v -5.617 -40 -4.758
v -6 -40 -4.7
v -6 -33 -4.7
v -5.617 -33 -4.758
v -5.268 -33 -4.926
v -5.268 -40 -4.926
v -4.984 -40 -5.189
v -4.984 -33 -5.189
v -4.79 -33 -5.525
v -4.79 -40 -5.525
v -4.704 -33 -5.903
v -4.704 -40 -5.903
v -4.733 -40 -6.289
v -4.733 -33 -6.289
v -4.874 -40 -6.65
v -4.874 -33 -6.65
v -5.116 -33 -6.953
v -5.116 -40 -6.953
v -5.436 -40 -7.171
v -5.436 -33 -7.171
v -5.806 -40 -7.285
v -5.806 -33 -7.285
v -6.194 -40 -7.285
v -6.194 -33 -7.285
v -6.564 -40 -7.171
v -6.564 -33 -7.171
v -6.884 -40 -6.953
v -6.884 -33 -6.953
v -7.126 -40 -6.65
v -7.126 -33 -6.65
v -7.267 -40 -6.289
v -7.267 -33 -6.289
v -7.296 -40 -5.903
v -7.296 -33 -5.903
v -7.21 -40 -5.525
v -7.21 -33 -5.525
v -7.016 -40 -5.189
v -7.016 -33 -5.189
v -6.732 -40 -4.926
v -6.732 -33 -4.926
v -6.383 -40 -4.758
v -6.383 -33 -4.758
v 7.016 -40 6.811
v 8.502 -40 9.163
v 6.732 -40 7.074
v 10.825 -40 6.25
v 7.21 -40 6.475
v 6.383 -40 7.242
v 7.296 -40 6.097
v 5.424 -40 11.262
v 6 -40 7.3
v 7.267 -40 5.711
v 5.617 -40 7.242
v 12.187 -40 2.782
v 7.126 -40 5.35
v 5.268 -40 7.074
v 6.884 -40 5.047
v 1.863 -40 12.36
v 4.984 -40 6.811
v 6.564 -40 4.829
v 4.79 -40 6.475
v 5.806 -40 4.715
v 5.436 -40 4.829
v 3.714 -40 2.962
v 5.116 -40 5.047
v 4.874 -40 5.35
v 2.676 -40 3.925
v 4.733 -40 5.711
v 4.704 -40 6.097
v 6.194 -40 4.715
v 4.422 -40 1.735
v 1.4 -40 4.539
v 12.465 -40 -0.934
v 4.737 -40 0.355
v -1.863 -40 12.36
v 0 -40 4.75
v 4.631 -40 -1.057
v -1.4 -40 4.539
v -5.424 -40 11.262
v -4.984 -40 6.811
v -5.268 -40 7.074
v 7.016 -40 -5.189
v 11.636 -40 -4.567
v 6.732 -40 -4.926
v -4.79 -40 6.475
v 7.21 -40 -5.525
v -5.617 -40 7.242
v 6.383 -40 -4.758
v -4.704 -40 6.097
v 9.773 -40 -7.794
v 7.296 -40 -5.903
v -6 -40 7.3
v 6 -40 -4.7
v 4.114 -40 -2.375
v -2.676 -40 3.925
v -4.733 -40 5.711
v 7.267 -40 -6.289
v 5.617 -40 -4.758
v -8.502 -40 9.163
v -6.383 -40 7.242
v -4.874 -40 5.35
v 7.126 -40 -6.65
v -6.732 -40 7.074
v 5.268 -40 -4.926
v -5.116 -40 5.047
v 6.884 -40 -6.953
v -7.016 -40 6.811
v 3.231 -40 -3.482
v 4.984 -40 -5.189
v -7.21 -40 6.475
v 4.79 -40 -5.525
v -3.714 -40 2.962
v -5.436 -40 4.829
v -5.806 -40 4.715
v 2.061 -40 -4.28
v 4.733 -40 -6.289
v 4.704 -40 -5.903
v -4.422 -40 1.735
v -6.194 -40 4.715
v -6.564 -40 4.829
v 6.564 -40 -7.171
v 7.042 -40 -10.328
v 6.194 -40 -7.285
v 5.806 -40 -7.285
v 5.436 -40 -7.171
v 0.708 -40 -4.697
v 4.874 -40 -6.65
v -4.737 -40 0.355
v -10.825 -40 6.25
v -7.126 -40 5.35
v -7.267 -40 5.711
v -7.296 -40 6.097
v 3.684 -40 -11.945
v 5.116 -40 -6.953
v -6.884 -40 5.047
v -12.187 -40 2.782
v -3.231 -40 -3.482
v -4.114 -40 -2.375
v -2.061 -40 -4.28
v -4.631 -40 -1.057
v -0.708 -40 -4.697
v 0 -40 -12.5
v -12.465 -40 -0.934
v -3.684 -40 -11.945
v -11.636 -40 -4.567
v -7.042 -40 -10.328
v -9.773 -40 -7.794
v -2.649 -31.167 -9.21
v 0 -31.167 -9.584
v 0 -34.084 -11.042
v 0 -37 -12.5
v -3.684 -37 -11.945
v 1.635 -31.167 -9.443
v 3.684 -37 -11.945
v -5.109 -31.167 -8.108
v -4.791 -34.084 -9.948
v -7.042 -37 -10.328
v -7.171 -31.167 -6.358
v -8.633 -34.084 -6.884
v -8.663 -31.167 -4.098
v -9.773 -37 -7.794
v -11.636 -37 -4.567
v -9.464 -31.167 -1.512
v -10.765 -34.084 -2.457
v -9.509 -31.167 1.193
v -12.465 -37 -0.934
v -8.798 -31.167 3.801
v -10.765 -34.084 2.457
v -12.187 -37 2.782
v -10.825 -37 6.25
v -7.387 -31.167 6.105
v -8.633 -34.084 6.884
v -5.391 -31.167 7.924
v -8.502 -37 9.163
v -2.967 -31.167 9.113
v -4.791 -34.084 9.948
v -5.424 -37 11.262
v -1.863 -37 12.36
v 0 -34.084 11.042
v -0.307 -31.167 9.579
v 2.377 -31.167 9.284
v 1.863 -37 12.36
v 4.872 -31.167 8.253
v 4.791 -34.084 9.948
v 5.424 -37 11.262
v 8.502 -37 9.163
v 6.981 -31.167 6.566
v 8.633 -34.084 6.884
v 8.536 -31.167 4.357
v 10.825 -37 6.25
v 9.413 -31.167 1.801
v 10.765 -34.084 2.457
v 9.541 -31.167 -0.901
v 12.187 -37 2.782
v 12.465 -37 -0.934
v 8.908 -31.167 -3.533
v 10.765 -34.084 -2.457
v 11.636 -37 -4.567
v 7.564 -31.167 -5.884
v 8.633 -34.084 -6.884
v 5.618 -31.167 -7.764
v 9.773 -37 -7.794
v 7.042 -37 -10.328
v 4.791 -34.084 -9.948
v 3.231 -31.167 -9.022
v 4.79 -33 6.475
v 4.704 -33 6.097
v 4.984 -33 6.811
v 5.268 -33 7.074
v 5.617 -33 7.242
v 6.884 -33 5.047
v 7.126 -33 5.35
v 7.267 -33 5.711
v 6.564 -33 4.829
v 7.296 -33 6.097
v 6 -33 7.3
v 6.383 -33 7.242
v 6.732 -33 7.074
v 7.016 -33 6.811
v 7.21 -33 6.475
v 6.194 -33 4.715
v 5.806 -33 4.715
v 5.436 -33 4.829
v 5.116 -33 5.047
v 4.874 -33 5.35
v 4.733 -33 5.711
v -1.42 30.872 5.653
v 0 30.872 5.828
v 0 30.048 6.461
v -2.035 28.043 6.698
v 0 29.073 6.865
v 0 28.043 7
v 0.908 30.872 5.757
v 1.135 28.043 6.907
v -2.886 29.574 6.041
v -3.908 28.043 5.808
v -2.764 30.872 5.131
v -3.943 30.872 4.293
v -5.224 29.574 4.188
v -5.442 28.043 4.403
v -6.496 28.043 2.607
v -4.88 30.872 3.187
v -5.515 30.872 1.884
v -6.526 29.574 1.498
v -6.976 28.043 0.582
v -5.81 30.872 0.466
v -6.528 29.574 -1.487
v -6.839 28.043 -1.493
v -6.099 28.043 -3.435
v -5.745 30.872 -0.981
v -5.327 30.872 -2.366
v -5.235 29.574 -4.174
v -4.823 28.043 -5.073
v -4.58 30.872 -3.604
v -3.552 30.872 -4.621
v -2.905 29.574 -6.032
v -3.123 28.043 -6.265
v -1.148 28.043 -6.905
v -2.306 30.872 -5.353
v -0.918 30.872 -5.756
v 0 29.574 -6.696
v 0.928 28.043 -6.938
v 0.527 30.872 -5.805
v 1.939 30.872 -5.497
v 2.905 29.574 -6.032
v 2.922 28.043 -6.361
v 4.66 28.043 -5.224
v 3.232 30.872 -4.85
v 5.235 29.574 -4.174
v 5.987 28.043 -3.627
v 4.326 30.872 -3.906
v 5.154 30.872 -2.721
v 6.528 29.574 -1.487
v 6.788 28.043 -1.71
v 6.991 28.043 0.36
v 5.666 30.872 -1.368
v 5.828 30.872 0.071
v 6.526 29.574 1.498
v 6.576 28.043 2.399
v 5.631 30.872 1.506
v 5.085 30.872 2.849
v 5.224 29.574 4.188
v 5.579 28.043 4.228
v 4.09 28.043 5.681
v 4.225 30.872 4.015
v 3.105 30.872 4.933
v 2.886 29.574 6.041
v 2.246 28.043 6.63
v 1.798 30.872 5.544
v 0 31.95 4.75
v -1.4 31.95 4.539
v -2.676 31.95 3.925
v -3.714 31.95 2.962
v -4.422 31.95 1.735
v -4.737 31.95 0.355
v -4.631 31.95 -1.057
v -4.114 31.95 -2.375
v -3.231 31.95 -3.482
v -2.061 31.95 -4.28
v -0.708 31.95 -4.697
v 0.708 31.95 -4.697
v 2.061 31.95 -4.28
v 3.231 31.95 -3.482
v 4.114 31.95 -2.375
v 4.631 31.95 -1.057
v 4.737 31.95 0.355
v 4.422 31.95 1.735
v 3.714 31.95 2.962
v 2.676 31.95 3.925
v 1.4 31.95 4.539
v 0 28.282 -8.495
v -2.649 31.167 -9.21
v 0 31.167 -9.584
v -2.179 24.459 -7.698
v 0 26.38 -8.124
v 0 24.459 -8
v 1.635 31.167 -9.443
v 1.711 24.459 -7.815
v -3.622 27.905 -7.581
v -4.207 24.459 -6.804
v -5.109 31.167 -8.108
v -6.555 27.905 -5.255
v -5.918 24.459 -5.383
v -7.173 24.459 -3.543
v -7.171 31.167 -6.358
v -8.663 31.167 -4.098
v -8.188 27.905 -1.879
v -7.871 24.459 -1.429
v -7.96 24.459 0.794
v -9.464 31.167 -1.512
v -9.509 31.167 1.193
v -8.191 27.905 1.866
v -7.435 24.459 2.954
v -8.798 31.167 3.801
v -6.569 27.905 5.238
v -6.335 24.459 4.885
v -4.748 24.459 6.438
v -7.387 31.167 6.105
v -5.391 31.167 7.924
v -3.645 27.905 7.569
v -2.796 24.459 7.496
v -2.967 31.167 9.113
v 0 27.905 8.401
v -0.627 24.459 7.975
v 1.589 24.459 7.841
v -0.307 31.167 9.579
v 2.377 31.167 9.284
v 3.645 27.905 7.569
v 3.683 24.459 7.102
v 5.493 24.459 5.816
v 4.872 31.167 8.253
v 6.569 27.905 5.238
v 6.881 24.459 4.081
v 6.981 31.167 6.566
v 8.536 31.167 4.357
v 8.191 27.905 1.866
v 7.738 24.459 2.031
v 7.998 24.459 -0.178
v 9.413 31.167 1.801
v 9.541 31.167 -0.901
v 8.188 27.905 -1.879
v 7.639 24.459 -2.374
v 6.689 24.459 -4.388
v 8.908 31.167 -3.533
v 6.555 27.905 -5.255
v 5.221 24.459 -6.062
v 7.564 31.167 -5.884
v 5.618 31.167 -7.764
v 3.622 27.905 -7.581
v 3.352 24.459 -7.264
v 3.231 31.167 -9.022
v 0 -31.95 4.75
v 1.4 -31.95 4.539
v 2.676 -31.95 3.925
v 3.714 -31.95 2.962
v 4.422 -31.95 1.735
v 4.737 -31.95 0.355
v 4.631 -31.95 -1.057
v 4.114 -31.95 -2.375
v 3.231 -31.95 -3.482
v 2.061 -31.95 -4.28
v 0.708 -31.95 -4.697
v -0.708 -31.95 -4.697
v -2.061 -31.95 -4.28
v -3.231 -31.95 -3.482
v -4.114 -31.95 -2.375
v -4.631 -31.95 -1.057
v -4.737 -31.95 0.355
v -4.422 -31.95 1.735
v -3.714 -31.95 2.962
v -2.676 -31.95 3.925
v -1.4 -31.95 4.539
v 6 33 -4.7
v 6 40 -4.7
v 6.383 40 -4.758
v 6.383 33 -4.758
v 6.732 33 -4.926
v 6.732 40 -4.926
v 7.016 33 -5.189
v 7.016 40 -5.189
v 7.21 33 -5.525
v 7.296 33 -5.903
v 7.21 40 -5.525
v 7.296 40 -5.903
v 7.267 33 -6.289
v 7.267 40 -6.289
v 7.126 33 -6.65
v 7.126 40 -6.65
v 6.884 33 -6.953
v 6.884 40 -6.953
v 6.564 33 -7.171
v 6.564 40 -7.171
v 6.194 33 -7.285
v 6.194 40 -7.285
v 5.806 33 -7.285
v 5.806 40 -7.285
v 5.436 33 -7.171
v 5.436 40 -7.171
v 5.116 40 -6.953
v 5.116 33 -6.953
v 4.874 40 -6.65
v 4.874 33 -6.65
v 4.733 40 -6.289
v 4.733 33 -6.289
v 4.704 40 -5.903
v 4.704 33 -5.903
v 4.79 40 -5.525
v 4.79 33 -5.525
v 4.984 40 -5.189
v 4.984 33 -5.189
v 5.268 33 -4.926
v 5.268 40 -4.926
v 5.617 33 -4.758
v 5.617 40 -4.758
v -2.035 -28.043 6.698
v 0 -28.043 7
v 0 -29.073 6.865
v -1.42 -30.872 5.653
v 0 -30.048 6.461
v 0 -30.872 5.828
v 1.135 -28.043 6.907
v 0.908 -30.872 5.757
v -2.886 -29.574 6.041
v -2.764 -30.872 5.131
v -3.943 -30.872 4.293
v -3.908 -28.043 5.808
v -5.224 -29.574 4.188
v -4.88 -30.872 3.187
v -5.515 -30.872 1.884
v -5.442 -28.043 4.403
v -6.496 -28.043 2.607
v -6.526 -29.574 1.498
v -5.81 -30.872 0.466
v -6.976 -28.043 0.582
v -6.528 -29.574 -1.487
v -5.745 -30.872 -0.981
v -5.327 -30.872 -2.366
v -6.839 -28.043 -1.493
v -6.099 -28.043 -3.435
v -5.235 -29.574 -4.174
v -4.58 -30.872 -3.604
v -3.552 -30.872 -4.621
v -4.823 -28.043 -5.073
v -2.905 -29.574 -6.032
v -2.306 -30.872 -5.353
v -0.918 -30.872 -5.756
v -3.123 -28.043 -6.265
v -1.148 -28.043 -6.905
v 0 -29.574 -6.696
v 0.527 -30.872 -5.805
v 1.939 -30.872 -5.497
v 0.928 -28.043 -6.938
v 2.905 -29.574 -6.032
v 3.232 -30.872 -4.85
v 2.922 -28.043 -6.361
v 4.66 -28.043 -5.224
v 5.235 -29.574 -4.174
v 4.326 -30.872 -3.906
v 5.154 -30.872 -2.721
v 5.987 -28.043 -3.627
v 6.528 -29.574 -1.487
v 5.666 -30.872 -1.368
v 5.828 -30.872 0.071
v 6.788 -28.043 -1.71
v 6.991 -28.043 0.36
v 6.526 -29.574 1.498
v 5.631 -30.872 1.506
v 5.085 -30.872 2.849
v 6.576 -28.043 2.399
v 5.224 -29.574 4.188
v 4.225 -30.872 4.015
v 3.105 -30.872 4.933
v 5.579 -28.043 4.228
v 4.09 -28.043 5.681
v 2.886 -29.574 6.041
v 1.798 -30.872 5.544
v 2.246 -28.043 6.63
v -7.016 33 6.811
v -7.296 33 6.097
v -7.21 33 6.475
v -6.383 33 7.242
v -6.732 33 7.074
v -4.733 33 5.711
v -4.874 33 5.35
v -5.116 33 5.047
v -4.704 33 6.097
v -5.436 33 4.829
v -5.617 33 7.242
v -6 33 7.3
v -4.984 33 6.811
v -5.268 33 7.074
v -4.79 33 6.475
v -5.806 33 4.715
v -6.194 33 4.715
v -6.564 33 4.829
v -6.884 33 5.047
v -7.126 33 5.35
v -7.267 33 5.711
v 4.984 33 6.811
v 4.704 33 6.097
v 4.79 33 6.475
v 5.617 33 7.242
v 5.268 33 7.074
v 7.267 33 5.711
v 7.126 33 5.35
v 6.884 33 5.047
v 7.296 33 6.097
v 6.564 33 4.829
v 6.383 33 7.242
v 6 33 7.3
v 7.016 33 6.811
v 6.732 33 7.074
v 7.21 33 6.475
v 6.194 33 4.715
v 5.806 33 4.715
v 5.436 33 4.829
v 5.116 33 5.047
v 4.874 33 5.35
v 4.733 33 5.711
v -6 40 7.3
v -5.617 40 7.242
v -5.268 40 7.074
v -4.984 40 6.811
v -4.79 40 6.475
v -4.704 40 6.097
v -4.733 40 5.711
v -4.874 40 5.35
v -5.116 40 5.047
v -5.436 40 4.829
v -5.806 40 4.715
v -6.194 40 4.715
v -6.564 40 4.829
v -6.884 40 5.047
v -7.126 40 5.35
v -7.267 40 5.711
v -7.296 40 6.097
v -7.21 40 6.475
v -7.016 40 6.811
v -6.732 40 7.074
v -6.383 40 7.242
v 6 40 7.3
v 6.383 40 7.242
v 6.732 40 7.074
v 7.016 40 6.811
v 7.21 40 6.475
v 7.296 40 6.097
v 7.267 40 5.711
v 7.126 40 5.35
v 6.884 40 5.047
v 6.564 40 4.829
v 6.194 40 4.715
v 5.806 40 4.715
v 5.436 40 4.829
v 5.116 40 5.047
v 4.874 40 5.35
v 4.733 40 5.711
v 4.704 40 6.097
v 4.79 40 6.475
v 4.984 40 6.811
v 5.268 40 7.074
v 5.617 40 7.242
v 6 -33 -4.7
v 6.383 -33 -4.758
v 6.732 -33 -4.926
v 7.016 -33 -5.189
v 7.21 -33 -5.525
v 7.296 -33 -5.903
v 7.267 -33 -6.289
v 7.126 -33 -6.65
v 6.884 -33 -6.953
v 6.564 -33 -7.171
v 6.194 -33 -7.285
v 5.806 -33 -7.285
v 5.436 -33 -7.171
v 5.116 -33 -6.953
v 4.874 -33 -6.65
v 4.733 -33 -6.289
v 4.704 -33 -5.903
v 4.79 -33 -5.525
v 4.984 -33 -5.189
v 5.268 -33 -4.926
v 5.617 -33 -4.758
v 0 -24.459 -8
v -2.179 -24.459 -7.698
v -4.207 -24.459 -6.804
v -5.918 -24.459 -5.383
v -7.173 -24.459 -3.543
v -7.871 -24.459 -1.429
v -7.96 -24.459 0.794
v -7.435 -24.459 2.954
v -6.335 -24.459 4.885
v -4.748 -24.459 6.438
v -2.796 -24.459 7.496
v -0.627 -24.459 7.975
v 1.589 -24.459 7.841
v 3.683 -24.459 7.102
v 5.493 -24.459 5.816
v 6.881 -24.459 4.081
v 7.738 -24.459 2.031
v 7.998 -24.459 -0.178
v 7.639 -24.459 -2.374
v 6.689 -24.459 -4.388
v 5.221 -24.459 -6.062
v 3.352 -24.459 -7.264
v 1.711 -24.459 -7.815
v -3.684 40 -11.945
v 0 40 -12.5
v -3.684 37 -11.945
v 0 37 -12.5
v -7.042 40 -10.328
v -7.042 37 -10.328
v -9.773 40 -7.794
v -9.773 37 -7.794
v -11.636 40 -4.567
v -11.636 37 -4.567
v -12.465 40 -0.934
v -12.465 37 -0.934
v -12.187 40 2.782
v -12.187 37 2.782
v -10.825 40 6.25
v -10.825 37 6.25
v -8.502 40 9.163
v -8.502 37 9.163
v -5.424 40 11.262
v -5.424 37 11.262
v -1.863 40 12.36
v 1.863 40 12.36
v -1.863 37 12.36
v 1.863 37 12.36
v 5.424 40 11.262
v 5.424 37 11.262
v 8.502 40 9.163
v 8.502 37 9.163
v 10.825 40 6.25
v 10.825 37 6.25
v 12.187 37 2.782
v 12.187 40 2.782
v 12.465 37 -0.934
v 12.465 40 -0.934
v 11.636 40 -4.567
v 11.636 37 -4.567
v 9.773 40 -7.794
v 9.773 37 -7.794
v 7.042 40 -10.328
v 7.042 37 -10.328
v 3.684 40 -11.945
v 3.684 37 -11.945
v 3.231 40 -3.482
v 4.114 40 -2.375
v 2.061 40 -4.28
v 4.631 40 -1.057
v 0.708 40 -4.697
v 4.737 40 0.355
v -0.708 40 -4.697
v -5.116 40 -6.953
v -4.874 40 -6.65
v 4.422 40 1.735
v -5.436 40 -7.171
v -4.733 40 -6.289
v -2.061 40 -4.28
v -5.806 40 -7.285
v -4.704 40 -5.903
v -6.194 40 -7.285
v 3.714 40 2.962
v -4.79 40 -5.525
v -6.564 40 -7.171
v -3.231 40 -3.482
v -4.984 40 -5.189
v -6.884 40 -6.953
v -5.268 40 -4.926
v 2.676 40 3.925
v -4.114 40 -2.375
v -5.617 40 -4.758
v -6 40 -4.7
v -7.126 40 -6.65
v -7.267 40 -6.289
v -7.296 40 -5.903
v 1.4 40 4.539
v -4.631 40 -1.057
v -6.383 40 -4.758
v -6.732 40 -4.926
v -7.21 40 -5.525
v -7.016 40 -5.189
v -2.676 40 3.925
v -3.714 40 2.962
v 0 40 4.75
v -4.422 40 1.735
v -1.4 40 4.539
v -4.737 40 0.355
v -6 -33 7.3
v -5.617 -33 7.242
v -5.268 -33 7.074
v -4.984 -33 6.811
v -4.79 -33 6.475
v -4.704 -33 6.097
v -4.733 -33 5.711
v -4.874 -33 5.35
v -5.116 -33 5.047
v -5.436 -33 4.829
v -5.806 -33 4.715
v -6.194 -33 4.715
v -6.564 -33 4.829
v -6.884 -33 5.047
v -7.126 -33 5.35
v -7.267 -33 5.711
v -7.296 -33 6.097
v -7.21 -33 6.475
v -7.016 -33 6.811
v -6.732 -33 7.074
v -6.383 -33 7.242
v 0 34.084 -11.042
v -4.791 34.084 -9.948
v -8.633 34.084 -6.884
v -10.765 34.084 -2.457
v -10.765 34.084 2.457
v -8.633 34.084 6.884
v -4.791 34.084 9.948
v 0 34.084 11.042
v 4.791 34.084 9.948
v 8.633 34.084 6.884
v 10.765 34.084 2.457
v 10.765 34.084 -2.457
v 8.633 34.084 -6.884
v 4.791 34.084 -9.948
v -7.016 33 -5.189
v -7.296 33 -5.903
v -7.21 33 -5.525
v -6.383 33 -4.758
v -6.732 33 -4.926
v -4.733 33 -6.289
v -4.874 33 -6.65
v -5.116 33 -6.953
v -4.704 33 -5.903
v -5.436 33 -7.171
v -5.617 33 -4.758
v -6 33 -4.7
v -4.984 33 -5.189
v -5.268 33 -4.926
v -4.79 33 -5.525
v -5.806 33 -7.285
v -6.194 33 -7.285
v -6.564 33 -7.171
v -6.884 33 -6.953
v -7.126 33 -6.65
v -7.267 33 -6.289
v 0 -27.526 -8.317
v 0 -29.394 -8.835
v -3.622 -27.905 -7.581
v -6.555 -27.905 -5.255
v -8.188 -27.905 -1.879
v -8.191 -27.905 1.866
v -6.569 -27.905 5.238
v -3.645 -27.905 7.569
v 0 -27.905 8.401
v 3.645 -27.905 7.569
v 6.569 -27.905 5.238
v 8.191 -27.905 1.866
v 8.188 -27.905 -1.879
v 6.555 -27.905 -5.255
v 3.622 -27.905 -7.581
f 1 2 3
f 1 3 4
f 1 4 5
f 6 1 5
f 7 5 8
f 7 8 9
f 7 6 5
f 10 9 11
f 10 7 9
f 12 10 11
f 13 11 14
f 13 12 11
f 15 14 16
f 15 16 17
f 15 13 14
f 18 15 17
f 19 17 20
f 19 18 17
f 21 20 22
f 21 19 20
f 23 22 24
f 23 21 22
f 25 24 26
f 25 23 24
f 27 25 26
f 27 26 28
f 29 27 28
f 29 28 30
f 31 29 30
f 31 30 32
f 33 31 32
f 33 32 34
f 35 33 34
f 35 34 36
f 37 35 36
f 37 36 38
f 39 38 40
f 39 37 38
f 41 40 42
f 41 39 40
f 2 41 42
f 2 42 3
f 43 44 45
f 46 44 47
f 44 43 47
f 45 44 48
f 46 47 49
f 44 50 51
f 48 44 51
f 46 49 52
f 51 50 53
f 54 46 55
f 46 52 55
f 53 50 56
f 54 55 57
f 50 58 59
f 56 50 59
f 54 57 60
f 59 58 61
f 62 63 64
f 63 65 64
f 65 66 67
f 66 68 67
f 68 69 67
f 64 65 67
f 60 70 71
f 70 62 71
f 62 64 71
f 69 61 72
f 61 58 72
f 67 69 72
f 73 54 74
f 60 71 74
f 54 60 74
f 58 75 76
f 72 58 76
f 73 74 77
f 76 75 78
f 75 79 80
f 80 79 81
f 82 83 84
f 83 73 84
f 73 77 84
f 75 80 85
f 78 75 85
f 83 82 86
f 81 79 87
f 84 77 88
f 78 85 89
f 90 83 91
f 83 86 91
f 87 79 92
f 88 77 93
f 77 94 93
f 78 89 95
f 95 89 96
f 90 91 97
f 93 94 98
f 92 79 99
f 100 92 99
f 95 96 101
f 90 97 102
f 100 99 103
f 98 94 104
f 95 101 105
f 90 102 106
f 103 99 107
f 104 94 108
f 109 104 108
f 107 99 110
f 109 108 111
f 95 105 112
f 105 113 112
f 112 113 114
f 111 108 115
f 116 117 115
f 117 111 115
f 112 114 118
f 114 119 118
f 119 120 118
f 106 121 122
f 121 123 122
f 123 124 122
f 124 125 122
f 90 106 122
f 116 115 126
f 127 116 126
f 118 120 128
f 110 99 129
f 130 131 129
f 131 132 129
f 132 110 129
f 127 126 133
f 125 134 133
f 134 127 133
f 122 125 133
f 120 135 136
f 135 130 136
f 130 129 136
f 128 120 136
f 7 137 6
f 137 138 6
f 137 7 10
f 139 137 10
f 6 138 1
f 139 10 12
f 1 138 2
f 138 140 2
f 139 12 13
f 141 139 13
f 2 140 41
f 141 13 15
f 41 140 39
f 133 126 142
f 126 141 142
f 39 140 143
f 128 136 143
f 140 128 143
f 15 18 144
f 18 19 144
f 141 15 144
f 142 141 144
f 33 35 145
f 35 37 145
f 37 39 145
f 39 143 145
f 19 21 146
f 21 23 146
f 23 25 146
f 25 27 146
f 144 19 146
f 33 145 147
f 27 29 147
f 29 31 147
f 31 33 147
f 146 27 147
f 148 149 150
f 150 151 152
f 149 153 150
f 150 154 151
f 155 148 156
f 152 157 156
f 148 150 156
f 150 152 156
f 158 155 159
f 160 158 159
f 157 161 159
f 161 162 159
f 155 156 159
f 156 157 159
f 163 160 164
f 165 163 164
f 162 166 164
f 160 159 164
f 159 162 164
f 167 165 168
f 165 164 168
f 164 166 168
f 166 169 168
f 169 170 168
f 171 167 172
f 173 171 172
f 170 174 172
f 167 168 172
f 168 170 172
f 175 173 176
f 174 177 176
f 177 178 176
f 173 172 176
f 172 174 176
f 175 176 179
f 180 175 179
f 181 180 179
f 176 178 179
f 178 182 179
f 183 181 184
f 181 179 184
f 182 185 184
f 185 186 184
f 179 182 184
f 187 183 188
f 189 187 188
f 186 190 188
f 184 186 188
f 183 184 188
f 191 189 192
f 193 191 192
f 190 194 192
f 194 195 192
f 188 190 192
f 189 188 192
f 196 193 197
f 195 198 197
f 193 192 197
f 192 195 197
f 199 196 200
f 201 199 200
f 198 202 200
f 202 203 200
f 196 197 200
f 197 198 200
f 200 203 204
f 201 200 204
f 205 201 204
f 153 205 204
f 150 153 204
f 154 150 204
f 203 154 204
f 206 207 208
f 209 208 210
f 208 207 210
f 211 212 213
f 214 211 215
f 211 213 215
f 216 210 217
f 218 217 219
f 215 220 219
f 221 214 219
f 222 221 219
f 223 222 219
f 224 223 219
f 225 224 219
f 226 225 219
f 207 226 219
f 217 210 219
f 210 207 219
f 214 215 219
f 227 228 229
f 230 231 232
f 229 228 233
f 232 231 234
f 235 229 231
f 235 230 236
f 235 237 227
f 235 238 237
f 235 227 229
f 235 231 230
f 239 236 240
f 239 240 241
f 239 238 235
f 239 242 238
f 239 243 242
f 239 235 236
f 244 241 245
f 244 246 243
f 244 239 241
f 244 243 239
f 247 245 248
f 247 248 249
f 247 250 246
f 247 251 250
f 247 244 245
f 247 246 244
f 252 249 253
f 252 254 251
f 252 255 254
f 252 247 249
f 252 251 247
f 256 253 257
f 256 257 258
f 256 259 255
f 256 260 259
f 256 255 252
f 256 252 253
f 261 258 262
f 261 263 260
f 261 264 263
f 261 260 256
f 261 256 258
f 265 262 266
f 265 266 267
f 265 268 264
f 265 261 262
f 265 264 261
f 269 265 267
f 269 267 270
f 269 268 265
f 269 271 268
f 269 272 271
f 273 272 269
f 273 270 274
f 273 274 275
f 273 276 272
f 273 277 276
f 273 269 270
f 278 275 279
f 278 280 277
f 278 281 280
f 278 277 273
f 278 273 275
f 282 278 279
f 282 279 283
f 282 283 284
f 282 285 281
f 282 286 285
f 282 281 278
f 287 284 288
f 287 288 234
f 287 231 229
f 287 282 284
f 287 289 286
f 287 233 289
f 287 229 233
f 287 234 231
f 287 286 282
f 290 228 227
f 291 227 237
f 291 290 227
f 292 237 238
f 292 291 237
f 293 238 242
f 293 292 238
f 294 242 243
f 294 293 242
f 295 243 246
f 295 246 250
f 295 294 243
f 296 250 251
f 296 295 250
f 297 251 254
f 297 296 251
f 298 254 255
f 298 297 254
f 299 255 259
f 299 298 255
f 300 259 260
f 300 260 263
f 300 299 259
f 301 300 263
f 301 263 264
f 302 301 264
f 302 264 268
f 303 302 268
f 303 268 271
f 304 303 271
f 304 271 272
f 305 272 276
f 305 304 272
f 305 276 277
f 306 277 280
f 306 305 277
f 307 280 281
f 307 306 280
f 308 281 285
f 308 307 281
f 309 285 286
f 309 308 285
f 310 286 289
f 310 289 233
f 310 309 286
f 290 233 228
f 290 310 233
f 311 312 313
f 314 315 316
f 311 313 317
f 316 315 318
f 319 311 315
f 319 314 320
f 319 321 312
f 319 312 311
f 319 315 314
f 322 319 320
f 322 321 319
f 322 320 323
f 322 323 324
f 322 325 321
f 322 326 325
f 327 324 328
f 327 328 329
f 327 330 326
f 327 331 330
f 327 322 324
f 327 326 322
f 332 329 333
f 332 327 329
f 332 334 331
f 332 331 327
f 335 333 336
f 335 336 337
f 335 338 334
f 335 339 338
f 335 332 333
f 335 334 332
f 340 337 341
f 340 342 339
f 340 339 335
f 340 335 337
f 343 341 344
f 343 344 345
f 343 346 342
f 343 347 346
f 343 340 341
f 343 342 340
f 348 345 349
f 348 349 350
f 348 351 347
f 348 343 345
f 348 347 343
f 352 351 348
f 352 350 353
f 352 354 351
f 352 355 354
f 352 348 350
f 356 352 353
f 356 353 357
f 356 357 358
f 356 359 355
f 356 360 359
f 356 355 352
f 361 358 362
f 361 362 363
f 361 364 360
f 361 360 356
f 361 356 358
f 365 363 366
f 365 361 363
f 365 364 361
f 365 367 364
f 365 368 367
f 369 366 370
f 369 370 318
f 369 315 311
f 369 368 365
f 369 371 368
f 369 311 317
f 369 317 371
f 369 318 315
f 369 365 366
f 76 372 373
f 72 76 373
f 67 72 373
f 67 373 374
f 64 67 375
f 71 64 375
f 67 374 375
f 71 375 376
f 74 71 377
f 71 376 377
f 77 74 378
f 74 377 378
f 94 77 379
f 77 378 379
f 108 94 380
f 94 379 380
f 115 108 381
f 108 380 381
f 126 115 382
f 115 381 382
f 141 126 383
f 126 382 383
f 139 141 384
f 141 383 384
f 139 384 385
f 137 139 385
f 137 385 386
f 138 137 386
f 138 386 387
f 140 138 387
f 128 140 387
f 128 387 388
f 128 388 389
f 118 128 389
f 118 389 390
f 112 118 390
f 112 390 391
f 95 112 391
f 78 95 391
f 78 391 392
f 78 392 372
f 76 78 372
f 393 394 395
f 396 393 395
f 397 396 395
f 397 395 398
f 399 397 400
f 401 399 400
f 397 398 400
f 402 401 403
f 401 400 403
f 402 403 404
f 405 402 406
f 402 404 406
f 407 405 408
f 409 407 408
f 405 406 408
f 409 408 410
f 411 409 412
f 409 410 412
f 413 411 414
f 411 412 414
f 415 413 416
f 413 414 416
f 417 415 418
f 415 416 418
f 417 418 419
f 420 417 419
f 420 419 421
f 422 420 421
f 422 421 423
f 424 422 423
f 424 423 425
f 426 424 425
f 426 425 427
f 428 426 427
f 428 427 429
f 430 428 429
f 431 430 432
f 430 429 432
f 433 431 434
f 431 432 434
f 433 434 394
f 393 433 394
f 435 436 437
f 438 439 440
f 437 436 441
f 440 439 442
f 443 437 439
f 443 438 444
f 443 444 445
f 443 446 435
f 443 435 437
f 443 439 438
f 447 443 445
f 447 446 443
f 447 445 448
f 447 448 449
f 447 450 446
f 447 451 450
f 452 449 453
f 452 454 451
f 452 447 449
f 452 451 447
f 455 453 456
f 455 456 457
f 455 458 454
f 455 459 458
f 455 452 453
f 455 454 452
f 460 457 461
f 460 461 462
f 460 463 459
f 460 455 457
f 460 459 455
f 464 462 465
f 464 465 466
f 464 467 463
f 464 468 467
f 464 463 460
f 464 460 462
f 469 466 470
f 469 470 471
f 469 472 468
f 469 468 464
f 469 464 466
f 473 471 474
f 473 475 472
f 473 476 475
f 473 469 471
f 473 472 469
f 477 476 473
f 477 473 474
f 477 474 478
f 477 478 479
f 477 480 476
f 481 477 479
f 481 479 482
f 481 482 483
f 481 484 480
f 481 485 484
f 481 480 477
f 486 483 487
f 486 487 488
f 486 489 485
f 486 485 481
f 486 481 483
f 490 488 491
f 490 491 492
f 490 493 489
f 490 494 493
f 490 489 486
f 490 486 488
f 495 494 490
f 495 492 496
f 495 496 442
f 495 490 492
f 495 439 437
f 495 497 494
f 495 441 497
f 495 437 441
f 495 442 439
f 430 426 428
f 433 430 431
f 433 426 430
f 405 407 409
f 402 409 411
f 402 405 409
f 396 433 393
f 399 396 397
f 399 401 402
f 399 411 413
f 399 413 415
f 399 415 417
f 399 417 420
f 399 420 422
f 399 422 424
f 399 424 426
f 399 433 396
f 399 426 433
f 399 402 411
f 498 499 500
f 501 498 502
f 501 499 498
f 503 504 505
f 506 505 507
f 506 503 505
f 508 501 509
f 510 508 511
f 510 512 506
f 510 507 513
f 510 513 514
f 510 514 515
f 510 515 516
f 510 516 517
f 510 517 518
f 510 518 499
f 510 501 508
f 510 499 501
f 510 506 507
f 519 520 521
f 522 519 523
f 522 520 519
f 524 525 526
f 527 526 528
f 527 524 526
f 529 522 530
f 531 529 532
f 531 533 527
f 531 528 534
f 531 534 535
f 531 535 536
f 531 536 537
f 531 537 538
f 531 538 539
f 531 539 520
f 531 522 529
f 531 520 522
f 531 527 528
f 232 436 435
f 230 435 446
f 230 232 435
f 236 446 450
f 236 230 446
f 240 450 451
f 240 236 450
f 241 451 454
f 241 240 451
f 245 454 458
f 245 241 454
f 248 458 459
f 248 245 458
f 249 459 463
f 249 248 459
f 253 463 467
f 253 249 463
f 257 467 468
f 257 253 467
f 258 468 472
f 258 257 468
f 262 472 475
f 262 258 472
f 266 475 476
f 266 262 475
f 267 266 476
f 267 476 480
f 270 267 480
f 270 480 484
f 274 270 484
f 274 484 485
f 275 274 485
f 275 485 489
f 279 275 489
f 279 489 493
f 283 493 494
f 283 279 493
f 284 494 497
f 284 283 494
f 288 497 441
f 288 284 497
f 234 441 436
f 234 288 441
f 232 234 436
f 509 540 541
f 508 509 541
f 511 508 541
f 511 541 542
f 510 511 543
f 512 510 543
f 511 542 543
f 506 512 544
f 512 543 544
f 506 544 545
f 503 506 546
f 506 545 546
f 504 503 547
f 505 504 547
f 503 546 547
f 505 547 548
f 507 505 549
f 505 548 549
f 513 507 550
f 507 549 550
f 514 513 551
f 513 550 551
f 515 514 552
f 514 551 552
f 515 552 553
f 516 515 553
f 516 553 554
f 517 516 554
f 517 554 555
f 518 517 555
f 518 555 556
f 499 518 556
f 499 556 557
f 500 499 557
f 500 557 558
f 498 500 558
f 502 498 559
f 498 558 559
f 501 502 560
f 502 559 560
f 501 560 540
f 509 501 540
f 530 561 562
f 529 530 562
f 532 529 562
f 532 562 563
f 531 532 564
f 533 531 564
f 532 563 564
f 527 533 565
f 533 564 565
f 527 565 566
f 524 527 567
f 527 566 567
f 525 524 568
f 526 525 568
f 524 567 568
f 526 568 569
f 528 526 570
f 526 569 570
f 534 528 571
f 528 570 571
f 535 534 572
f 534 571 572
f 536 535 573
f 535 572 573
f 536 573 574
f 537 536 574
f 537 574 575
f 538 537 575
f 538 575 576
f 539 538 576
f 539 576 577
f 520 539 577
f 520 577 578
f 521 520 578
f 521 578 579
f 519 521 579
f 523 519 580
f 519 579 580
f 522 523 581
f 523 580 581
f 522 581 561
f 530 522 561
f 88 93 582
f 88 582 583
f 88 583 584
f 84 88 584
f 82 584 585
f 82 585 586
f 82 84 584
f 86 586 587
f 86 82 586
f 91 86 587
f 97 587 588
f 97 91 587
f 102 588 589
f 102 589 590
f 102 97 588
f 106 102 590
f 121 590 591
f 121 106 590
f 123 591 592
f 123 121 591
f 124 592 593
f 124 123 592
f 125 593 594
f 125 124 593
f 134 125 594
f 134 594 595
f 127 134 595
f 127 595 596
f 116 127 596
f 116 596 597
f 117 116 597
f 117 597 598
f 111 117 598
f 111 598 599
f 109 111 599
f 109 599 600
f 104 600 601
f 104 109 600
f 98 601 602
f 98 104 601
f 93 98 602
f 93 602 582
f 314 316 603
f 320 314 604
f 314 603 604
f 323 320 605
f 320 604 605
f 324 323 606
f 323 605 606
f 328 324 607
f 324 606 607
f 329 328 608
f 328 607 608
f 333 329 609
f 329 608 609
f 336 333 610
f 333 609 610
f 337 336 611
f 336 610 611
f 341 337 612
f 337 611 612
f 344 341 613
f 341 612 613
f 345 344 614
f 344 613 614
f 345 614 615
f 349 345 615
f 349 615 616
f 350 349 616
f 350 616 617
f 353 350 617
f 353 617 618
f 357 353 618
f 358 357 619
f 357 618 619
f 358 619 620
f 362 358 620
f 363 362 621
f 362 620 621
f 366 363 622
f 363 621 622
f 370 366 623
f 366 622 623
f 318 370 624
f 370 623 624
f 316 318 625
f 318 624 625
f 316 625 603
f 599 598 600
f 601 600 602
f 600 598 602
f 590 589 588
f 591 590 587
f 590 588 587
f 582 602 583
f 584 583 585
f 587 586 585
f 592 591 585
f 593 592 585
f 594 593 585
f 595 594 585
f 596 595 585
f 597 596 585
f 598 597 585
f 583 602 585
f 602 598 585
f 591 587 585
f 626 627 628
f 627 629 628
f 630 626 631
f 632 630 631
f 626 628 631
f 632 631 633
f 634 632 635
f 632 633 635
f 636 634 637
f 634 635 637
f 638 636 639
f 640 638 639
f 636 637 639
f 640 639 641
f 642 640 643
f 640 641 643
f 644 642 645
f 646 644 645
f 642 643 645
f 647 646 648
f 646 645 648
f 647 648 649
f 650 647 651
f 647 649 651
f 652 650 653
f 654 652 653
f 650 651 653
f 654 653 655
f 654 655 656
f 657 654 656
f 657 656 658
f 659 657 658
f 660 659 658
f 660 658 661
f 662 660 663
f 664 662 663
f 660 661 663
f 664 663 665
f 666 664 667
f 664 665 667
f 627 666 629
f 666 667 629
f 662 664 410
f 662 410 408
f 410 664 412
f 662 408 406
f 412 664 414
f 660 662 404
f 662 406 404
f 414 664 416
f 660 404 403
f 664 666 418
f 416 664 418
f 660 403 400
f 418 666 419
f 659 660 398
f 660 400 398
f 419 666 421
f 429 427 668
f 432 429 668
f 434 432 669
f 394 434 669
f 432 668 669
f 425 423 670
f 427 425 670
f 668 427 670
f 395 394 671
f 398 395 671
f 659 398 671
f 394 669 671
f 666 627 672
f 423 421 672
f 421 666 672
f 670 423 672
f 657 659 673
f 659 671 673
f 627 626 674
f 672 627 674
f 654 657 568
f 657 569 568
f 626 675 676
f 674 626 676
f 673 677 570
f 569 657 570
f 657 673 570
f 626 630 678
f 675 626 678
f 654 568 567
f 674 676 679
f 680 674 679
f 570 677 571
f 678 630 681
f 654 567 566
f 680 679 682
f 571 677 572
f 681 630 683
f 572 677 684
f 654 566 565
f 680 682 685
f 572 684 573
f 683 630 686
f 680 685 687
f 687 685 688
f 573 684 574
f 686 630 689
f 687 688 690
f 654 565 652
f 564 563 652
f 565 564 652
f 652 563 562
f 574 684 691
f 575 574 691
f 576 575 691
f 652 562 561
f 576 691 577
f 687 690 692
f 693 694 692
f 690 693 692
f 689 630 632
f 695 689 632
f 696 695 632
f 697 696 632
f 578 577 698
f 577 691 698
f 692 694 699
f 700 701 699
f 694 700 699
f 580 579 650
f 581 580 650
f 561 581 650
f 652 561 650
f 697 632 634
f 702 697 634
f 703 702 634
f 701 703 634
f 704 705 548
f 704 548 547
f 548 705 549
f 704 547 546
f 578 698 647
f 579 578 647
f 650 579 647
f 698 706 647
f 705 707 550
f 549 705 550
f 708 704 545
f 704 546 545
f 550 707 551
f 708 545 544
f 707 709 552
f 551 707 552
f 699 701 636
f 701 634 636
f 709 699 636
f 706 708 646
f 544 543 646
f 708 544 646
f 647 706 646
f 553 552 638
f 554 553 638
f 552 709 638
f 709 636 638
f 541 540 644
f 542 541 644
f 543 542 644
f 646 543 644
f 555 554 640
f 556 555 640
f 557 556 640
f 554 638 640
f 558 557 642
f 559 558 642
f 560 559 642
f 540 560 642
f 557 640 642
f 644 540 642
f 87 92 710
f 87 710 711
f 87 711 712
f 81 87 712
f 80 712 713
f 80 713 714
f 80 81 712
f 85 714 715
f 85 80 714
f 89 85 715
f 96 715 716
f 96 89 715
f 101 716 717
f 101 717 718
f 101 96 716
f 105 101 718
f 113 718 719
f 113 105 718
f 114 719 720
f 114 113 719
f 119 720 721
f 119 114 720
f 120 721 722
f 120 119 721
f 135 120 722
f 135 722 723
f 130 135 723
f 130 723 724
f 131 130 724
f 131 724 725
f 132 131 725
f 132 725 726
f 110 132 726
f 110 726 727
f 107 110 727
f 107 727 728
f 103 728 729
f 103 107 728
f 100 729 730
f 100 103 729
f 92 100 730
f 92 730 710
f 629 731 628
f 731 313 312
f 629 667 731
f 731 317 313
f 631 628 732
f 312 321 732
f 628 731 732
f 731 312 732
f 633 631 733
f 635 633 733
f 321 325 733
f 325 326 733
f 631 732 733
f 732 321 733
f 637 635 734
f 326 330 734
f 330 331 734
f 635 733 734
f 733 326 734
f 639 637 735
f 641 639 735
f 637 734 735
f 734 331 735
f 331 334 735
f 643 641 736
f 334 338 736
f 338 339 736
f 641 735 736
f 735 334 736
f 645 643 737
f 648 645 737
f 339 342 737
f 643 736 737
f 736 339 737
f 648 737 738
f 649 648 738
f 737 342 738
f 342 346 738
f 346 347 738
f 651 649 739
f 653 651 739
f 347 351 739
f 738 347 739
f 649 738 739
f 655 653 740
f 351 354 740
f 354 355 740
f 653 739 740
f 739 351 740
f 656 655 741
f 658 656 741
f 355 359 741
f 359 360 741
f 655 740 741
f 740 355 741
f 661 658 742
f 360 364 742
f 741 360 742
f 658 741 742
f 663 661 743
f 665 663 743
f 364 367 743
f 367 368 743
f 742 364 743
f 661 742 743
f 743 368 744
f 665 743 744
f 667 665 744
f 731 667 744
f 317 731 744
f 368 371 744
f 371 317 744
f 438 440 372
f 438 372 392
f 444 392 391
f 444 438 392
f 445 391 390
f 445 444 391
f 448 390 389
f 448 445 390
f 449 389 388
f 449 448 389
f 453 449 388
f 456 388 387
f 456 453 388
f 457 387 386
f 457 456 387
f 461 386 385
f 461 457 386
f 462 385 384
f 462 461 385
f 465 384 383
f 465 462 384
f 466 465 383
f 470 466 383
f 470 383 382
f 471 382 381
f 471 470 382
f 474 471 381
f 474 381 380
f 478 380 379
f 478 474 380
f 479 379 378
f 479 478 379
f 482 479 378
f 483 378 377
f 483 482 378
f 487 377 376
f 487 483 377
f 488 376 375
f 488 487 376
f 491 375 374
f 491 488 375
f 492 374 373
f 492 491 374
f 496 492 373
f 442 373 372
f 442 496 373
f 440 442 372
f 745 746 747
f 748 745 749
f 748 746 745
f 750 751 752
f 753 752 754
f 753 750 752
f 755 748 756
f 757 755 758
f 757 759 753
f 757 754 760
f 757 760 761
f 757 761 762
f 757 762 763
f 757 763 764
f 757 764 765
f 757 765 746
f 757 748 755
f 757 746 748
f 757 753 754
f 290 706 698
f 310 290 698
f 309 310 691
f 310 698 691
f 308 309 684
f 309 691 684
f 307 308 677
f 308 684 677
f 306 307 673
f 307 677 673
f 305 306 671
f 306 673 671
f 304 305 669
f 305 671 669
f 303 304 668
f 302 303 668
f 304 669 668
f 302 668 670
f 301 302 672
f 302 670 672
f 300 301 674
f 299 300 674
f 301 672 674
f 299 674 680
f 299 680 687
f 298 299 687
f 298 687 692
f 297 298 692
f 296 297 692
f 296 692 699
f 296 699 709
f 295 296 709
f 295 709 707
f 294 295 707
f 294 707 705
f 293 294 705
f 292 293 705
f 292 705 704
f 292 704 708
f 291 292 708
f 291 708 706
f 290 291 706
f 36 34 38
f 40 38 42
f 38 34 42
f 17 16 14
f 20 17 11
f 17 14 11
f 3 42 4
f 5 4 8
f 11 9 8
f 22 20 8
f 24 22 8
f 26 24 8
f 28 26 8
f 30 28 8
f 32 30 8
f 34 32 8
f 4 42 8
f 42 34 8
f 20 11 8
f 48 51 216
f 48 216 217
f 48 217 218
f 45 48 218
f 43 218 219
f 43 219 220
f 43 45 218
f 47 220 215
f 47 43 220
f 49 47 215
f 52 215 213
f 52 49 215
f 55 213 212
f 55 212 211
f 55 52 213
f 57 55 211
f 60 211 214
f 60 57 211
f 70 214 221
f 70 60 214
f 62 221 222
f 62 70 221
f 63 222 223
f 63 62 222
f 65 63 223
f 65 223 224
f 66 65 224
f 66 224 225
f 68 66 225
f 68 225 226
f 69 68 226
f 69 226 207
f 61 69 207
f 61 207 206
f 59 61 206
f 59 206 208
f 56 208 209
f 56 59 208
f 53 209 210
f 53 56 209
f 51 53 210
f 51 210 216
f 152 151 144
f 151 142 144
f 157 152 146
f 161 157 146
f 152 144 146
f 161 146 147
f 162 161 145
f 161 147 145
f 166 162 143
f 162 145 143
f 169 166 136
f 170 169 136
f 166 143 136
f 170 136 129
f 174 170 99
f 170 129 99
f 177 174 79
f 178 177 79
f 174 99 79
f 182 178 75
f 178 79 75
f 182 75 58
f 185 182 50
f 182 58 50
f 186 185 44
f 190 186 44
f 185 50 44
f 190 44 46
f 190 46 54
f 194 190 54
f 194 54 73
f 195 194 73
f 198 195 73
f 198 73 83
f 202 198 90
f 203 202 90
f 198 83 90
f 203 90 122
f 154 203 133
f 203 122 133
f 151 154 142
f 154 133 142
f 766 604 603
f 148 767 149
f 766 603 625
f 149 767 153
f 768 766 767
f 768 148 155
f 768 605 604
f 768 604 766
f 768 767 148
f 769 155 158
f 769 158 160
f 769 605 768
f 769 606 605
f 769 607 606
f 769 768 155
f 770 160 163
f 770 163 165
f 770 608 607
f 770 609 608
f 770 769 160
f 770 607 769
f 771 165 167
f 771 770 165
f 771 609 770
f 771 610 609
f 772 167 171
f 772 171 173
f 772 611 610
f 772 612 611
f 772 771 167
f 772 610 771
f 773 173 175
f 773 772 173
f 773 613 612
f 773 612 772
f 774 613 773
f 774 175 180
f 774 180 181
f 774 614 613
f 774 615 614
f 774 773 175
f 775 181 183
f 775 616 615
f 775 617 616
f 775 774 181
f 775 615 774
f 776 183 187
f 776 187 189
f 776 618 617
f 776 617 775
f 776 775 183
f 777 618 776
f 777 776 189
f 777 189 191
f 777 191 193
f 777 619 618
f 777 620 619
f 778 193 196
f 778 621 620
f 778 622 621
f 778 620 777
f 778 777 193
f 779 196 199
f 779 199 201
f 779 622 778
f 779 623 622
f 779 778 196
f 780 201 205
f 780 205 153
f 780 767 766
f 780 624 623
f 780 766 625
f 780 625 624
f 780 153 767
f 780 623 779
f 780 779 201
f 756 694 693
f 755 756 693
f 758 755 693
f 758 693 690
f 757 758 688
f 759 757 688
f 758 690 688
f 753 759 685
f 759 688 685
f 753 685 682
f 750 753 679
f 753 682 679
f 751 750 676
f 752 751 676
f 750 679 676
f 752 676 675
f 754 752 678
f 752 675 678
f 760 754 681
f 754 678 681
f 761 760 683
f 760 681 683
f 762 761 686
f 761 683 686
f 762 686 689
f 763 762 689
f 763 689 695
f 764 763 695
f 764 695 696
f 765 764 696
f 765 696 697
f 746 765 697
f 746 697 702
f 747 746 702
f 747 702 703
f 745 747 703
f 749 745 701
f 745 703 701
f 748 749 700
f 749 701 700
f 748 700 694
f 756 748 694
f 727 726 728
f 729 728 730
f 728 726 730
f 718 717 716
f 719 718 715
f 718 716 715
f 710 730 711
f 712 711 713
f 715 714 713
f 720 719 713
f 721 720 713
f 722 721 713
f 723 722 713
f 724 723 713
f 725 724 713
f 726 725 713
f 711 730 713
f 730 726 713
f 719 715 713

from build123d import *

# Parameters (mm, degrees)
SKETCH2_R          = 1.3
CUT_EXTRUDE1_DEPTH = 7
SKETCH4_R          = 4.75
CUT_EXTRUDE2_DEPTH = 82.929848041
FILLET1_R          = 15
FILLET2_R          = 4


with BuildPart() as part:
    # Sketch1 → Revolve1 (revolve)
    with BuildSketch(Plane.XY, mode=Mode.PRIVATE) as revolve1_sk:
        Polygon((0, -40), (0, 40), (-12.5, 40), (-12.5, 37), (-8, 28), (-8, -28), (-12.5, -37), (-12.5, -40), align=None)
    revolve(revolve1_sk.sketch.rotate(Axis((0, -40, 0), (0, 1, 0)), 270), axis=Axis((0, -40, 0), (0, 1, 0)))

    # Sketch2 → Cut-Extrude1 (cut)
    with BuildSketch(Plane(origin=(0, 40, 0), x_dir=(1, 0, 0), z_dir=(0, 1, 0))):
        with Locations(Location((-6, 6, 0), (0, 0, 270))):
            Circle(SKETCH2_R)
        with Locations(Location((6, 6, 0), (0, 0, 270))):
            Circle(SKETCH2_R)
        with Locations(Location((-6, -6, 0), (0, 0, 270))):
            Circle(SKETCH2_R)
        with Locations(Location((6, -6, 0), (0, 0, 270))):
            Circle(SKETCH2_R)
    cut_extrude1 = extrude(amount=-CUT_EXTRUDE1_DEPTH, mode=Mode.SUBTRACT)

    # Mirror1: Cut-Extrude1 across plane
    add(cut_extrude1.mirror(Plane.ZX), mode=Mode.SUBTRACT)

    # Sketch3 → Cut-Revolve1 (revolve, cut)
    with BuildSketch(Plane(origin=(0, 0, 0), x_dir=(0, 0, -1), z_dir=(1, 0, 0))):
        Polygon((-7, 29.7), (0, 36.7), (0, -36.7), (-7, -29.7), align=None)
    revolve(axis=Axis((0, 36.7, 0), (0, -1, 0)), mode=Mode.SUBTRACT)

    # Sketch4 → Cut-Extrude2 (cut, through all)
    with BuildSketch(Plane(origin=(0, 40, 0), x_dir=(1, 0, 0), z_dir=(0, 1, 0))):
        with Locations(Location((0, 0, 0), (0, 0, 270))):
            Circle(SKETCH4_R)
    extrude(amount=-CUT_EXTRUDE2_DEPTH, mode=Mode.SUBTRACT)

    # Fillet1
    fillet1_edges = [part.edges().sort_by_distance(p)[0] for p in [
        (0, -28, 8),
        (0, 28, 8),
    ]]
    fillet(fillet1_edges, radius=FILLET1_R)

    # Fillet2
    fillet2_edges = [part.edges().sort_by_distance(p)[0] for p in [
        (0, 29.7, -7),
        (0, -29.7, -7),
    ]]
    fillet(fillet2_edges, radius=FILLET2_R)


solid = part.part
